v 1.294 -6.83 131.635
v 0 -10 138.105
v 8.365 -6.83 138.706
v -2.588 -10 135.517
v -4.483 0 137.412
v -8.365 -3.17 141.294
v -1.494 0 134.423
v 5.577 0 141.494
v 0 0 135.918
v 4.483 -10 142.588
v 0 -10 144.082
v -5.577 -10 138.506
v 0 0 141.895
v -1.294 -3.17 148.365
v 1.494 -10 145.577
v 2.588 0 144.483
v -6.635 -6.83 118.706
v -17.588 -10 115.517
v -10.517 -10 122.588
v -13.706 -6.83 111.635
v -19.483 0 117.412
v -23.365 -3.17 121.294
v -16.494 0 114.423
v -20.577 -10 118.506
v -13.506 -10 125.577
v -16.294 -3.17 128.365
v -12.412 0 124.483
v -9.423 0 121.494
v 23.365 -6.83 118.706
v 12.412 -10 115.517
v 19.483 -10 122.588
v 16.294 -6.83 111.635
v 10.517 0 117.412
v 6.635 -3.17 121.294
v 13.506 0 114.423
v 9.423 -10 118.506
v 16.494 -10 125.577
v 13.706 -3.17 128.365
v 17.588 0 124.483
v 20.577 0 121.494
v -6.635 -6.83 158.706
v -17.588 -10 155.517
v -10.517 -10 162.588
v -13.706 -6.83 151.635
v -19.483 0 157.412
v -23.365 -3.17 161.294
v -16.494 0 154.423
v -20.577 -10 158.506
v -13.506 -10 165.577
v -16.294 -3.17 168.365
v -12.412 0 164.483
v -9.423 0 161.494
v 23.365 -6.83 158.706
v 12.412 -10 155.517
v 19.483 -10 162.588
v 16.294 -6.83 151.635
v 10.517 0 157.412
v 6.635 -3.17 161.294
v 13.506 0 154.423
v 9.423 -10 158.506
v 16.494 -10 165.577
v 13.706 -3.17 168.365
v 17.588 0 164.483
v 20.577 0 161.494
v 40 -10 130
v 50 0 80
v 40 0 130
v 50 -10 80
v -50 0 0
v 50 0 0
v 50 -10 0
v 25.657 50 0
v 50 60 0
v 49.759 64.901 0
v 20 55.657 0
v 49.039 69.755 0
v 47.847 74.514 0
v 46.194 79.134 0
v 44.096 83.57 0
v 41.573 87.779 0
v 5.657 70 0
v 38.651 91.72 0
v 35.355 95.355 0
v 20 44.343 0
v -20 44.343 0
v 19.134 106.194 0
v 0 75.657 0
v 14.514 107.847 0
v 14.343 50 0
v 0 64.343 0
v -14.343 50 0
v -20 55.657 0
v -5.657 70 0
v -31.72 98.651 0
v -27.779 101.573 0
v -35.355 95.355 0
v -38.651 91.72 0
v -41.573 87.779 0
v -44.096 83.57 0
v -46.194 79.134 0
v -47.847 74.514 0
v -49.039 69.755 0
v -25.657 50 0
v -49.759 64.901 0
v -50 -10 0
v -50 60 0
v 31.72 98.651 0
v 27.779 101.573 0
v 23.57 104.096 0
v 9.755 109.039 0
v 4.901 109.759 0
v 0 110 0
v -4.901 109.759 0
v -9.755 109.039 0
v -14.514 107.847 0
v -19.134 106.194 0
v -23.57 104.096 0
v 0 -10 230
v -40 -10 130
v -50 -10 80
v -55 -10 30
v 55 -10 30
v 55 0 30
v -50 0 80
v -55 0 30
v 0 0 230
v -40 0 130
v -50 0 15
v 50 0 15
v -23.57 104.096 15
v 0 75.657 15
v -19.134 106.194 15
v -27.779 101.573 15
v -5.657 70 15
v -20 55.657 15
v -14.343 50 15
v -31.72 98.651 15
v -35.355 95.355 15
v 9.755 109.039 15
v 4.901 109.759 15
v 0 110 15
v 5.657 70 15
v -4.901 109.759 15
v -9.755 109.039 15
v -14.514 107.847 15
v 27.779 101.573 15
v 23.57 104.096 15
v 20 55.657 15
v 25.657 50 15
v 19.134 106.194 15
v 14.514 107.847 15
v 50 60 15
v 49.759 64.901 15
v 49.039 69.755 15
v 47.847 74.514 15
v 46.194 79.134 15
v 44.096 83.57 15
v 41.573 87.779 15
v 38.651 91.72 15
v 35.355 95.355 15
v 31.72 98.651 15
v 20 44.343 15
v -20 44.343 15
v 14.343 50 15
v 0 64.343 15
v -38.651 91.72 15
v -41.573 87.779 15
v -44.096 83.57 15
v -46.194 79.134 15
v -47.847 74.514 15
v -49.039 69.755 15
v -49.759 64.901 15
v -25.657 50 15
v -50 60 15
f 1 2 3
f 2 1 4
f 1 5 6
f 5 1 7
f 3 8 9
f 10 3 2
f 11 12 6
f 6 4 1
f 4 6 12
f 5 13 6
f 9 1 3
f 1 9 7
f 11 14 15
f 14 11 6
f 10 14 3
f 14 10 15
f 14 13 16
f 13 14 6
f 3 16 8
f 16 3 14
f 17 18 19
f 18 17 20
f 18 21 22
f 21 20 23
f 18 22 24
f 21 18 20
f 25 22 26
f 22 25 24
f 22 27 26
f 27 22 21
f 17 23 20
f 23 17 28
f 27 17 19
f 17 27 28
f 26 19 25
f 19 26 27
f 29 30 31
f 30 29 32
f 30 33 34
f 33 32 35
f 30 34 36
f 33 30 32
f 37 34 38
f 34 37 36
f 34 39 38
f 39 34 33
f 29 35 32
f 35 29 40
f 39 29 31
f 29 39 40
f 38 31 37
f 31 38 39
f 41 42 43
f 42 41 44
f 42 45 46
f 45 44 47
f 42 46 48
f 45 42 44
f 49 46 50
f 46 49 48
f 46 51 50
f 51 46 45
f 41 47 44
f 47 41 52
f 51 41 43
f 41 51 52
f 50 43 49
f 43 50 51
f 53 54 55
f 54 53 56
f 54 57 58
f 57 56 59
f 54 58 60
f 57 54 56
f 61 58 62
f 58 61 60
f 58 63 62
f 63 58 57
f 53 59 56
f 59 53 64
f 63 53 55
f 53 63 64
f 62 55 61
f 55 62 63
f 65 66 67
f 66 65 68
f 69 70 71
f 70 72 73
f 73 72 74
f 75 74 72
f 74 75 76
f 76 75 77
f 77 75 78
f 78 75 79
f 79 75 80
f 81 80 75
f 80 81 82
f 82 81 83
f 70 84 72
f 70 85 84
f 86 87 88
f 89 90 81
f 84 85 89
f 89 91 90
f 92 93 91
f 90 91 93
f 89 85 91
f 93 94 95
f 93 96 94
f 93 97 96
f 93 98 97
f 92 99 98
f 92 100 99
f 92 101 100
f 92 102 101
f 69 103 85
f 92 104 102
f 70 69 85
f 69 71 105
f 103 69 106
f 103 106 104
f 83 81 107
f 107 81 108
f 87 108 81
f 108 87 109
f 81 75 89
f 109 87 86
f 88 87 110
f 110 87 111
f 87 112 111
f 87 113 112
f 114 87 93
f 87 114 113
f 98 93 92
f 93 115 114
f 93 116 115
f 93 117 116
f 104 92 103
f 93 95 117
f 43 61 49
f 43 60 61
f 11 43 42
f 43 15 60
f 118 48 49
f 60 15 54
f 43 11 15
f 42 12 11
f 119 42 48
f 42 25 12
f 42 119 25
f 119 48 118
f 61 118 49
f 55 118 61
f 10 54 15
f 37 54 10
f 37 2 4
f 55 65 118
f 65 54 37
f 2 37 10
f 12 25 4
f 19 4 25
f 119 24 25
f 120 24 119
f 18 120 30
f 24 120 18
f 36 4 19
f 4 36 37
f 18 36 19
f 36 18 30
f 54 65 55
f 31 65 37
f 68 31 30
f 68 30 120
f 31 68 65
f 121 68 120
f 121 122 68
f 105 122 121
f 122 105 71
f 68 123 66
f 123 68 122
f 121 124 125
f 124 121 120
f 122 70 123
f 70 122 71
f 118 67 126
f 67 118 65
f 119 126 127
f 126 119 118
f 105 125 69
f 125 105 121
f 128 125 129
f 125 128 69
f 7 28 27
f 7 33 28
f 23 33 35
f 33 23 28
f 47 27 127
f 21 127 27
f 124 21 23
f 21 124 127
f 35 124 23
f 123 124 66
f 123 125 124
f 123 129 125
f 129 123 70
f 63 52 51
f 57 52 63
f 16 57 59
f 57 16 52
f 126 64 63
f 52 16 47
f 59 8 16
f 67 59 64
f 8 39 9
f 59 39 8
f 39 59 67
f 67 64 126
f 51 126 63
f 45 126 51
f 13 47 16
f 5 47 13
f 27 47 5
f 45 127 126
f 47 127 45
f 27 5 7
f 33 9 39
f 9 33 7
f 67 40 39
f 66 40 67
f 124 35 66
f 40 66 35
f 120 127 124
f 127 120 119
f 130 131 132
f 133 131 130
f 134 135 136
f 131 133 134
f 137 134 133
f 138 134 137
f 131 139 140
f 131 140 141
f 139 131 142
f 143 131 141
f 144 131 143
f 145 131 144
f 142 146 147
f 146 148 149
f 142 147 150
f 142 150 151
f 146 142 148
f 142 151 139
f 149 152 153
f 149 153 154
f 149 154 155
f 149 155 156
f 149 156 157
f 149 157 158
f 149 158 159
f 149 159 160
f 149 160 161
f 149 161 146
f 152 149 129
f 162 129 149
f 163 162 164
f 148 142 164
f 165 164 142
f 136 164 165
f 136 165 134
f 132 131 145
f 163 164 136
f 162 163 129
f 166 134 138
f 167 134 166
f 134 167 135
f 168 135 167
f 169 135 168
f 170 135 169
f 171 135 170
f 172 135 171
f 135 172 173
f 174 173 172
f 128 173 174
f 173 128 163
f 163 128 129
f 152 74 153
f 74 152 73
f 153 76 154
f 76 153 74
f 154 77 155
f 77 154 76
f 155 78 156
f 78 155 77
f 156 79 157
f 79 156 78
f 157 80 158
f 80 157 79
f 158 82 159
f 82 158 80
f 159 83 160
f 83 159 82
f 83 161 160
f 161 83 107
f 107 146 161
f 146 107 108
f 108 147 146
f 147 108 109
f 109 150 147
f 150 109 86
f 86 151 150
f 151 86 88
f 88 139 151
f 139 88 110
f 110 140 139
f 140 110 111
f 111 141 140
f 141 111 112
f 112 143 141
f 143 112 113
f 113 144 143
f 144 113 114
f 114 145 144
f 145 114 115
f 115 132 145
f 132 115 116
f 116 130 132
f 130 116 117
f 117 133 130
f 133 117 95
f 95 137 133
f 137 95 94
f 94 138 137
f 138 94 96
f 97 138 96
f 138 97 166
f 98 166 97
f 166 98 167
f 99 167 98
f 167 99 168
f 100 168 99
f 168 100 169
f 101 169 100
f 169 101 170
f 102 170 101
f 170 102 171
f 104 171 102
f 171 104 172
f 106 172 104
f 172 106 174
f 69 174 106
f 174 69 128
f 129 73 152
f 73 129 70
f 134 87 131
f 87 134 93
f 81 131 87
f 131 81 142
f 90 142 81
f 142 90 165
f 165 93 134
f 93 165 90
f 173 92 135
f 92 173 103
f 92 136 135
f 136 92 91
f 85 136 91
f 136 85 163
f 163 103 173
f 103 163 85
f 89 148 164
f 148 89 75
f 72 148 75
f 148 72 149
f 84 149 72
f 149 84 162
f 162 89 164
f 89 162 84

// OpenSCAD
// Parameters
seat_width      = 100;   // width of seat / backrest (x)
seat_depth      = 110;   // depth of seat (y)
seat_thick      = 15;    // thickness of horizontal base (z)
backrest_h      = 230;   // total height of vertical plate (z)
back_thick      = 10;    // thickness of vertical plate (y)
leg_length      = 100;   // length of legs (z)
leg_size        = 25;    // nominal width of leg cross-section
leg_R           = 130;   // radius of concave cylindrical faces
fillet_r        = 2;     // fillet radius on leg edges
$fn             = 64;

// ---------------------------------------------------------
// Leg cross-section: square with slight concave cylindrical sides
// ---------------------------------------------------------
function leg_poly(w, R, n=16) =
    let(hw = w/2,
        cx = hw + sqrt(R*R - hw*hw),
        alpha = asin(hw/R))
    concat(
        // right face  : bottom-right -> top-right
        [for (i=[0:n-1]) let(t = -alpha + (2*alpha)*i/n) [cx - R*cos(t), R*sin(t)]],
        // top face    : top-left -> top-right
        [for (i=[0:n-1]) let(t = -alpha + (2*alpha)*i/n) [R*sin(t), cx - R*cos(t)]],
        // left face   : top-left -> bottom-left
        [for (i=[0:n-1]) let(t = alpha - (2*alpha)*i/n) [-cx + R*cos(t), R*sin(t)]],
        // bottom face : bottom-right -> bottom-left
        [for (i=[0:n-1]) let(t = alpha - (2*alpha)*i/n) [R*sin(t), -cx + R*cos(t)]]
    );

module waisted_leg() {
    linear_extrude(height = leg_length)
        polygon(leg_poly(leg_size, leg_R, n=16));
}

// ---------------------------------------------------------
// Decorative bracket: seat + backrest
// ---------------------------------------------------------

// Seat plan-view profile: rectangle with semicircular front (R=50)
module seat_profile_2d() {
    difference() {
        union() {
            // rectangular rear part
            translate([-seat_width/2, 0])
                square([seat_width, seat_depth - 50]);
            // semicircular front feature
            translate([0, seat_depth - 50])
                circle(r = 50);
        }
        // diamond cutouts on top face
        for (p = [[0, 70], [-20, 50], [20, 50]])
            translate(p)
                rotate(45)
                    square([8, 8], center = true);
    }
}

// Backrest profile: pointed-leaf shape in x-y (becomes x-z after rotation)
backrest_pts = [
    [-50, 0],
    [-55, 30],
    [-50, 80],
    [-40, 130],
    [-20, 180],
    [0, backrest_h],
    [20, 180],
    [40, 130],
    [50, 80],
    [55, 30],
    [50, 0]
];

module backrest_solid() {
    difference() {
        linear_extrude(height = back_thick)
            polygon(backrest_pts);
        // diamond through-cutouts with tilted normals (~30°)
        for (p = [[0, 140], [-15, 120], [15, 120], [-15, 160], [15, 160]])
            translate([p[0], p[1], back_thick/2])
                rotate([30, 0, 45])
                    cube([10, 10, 10], center = true);
    }
}

module bracket() {
    // Horizontal seat
    linear_extrude(height = seat_thick)
        seat_profile_2d();

    // Vertical backrest plate (rotated to stand behind seat)
    translate([0, 0, 0])
        rotate([90, 0, 0])
            backrest_solid();
}

// ---------------------------------------------------------
// Assembly
// ---------------------------------------------------------
module assembly() {
    // Decorative bracket
    bracket();

    // Four waisted legs beneath seat
    leg_positions = [
        [-30, 20],
        [ 30, 20],
        [-30, 90],
        [ 30, 90]
    ];
    for (p = leg_positions)
        translate([p[0], p[1], -leg_length])
            waisted_leg();
}

assembly();
